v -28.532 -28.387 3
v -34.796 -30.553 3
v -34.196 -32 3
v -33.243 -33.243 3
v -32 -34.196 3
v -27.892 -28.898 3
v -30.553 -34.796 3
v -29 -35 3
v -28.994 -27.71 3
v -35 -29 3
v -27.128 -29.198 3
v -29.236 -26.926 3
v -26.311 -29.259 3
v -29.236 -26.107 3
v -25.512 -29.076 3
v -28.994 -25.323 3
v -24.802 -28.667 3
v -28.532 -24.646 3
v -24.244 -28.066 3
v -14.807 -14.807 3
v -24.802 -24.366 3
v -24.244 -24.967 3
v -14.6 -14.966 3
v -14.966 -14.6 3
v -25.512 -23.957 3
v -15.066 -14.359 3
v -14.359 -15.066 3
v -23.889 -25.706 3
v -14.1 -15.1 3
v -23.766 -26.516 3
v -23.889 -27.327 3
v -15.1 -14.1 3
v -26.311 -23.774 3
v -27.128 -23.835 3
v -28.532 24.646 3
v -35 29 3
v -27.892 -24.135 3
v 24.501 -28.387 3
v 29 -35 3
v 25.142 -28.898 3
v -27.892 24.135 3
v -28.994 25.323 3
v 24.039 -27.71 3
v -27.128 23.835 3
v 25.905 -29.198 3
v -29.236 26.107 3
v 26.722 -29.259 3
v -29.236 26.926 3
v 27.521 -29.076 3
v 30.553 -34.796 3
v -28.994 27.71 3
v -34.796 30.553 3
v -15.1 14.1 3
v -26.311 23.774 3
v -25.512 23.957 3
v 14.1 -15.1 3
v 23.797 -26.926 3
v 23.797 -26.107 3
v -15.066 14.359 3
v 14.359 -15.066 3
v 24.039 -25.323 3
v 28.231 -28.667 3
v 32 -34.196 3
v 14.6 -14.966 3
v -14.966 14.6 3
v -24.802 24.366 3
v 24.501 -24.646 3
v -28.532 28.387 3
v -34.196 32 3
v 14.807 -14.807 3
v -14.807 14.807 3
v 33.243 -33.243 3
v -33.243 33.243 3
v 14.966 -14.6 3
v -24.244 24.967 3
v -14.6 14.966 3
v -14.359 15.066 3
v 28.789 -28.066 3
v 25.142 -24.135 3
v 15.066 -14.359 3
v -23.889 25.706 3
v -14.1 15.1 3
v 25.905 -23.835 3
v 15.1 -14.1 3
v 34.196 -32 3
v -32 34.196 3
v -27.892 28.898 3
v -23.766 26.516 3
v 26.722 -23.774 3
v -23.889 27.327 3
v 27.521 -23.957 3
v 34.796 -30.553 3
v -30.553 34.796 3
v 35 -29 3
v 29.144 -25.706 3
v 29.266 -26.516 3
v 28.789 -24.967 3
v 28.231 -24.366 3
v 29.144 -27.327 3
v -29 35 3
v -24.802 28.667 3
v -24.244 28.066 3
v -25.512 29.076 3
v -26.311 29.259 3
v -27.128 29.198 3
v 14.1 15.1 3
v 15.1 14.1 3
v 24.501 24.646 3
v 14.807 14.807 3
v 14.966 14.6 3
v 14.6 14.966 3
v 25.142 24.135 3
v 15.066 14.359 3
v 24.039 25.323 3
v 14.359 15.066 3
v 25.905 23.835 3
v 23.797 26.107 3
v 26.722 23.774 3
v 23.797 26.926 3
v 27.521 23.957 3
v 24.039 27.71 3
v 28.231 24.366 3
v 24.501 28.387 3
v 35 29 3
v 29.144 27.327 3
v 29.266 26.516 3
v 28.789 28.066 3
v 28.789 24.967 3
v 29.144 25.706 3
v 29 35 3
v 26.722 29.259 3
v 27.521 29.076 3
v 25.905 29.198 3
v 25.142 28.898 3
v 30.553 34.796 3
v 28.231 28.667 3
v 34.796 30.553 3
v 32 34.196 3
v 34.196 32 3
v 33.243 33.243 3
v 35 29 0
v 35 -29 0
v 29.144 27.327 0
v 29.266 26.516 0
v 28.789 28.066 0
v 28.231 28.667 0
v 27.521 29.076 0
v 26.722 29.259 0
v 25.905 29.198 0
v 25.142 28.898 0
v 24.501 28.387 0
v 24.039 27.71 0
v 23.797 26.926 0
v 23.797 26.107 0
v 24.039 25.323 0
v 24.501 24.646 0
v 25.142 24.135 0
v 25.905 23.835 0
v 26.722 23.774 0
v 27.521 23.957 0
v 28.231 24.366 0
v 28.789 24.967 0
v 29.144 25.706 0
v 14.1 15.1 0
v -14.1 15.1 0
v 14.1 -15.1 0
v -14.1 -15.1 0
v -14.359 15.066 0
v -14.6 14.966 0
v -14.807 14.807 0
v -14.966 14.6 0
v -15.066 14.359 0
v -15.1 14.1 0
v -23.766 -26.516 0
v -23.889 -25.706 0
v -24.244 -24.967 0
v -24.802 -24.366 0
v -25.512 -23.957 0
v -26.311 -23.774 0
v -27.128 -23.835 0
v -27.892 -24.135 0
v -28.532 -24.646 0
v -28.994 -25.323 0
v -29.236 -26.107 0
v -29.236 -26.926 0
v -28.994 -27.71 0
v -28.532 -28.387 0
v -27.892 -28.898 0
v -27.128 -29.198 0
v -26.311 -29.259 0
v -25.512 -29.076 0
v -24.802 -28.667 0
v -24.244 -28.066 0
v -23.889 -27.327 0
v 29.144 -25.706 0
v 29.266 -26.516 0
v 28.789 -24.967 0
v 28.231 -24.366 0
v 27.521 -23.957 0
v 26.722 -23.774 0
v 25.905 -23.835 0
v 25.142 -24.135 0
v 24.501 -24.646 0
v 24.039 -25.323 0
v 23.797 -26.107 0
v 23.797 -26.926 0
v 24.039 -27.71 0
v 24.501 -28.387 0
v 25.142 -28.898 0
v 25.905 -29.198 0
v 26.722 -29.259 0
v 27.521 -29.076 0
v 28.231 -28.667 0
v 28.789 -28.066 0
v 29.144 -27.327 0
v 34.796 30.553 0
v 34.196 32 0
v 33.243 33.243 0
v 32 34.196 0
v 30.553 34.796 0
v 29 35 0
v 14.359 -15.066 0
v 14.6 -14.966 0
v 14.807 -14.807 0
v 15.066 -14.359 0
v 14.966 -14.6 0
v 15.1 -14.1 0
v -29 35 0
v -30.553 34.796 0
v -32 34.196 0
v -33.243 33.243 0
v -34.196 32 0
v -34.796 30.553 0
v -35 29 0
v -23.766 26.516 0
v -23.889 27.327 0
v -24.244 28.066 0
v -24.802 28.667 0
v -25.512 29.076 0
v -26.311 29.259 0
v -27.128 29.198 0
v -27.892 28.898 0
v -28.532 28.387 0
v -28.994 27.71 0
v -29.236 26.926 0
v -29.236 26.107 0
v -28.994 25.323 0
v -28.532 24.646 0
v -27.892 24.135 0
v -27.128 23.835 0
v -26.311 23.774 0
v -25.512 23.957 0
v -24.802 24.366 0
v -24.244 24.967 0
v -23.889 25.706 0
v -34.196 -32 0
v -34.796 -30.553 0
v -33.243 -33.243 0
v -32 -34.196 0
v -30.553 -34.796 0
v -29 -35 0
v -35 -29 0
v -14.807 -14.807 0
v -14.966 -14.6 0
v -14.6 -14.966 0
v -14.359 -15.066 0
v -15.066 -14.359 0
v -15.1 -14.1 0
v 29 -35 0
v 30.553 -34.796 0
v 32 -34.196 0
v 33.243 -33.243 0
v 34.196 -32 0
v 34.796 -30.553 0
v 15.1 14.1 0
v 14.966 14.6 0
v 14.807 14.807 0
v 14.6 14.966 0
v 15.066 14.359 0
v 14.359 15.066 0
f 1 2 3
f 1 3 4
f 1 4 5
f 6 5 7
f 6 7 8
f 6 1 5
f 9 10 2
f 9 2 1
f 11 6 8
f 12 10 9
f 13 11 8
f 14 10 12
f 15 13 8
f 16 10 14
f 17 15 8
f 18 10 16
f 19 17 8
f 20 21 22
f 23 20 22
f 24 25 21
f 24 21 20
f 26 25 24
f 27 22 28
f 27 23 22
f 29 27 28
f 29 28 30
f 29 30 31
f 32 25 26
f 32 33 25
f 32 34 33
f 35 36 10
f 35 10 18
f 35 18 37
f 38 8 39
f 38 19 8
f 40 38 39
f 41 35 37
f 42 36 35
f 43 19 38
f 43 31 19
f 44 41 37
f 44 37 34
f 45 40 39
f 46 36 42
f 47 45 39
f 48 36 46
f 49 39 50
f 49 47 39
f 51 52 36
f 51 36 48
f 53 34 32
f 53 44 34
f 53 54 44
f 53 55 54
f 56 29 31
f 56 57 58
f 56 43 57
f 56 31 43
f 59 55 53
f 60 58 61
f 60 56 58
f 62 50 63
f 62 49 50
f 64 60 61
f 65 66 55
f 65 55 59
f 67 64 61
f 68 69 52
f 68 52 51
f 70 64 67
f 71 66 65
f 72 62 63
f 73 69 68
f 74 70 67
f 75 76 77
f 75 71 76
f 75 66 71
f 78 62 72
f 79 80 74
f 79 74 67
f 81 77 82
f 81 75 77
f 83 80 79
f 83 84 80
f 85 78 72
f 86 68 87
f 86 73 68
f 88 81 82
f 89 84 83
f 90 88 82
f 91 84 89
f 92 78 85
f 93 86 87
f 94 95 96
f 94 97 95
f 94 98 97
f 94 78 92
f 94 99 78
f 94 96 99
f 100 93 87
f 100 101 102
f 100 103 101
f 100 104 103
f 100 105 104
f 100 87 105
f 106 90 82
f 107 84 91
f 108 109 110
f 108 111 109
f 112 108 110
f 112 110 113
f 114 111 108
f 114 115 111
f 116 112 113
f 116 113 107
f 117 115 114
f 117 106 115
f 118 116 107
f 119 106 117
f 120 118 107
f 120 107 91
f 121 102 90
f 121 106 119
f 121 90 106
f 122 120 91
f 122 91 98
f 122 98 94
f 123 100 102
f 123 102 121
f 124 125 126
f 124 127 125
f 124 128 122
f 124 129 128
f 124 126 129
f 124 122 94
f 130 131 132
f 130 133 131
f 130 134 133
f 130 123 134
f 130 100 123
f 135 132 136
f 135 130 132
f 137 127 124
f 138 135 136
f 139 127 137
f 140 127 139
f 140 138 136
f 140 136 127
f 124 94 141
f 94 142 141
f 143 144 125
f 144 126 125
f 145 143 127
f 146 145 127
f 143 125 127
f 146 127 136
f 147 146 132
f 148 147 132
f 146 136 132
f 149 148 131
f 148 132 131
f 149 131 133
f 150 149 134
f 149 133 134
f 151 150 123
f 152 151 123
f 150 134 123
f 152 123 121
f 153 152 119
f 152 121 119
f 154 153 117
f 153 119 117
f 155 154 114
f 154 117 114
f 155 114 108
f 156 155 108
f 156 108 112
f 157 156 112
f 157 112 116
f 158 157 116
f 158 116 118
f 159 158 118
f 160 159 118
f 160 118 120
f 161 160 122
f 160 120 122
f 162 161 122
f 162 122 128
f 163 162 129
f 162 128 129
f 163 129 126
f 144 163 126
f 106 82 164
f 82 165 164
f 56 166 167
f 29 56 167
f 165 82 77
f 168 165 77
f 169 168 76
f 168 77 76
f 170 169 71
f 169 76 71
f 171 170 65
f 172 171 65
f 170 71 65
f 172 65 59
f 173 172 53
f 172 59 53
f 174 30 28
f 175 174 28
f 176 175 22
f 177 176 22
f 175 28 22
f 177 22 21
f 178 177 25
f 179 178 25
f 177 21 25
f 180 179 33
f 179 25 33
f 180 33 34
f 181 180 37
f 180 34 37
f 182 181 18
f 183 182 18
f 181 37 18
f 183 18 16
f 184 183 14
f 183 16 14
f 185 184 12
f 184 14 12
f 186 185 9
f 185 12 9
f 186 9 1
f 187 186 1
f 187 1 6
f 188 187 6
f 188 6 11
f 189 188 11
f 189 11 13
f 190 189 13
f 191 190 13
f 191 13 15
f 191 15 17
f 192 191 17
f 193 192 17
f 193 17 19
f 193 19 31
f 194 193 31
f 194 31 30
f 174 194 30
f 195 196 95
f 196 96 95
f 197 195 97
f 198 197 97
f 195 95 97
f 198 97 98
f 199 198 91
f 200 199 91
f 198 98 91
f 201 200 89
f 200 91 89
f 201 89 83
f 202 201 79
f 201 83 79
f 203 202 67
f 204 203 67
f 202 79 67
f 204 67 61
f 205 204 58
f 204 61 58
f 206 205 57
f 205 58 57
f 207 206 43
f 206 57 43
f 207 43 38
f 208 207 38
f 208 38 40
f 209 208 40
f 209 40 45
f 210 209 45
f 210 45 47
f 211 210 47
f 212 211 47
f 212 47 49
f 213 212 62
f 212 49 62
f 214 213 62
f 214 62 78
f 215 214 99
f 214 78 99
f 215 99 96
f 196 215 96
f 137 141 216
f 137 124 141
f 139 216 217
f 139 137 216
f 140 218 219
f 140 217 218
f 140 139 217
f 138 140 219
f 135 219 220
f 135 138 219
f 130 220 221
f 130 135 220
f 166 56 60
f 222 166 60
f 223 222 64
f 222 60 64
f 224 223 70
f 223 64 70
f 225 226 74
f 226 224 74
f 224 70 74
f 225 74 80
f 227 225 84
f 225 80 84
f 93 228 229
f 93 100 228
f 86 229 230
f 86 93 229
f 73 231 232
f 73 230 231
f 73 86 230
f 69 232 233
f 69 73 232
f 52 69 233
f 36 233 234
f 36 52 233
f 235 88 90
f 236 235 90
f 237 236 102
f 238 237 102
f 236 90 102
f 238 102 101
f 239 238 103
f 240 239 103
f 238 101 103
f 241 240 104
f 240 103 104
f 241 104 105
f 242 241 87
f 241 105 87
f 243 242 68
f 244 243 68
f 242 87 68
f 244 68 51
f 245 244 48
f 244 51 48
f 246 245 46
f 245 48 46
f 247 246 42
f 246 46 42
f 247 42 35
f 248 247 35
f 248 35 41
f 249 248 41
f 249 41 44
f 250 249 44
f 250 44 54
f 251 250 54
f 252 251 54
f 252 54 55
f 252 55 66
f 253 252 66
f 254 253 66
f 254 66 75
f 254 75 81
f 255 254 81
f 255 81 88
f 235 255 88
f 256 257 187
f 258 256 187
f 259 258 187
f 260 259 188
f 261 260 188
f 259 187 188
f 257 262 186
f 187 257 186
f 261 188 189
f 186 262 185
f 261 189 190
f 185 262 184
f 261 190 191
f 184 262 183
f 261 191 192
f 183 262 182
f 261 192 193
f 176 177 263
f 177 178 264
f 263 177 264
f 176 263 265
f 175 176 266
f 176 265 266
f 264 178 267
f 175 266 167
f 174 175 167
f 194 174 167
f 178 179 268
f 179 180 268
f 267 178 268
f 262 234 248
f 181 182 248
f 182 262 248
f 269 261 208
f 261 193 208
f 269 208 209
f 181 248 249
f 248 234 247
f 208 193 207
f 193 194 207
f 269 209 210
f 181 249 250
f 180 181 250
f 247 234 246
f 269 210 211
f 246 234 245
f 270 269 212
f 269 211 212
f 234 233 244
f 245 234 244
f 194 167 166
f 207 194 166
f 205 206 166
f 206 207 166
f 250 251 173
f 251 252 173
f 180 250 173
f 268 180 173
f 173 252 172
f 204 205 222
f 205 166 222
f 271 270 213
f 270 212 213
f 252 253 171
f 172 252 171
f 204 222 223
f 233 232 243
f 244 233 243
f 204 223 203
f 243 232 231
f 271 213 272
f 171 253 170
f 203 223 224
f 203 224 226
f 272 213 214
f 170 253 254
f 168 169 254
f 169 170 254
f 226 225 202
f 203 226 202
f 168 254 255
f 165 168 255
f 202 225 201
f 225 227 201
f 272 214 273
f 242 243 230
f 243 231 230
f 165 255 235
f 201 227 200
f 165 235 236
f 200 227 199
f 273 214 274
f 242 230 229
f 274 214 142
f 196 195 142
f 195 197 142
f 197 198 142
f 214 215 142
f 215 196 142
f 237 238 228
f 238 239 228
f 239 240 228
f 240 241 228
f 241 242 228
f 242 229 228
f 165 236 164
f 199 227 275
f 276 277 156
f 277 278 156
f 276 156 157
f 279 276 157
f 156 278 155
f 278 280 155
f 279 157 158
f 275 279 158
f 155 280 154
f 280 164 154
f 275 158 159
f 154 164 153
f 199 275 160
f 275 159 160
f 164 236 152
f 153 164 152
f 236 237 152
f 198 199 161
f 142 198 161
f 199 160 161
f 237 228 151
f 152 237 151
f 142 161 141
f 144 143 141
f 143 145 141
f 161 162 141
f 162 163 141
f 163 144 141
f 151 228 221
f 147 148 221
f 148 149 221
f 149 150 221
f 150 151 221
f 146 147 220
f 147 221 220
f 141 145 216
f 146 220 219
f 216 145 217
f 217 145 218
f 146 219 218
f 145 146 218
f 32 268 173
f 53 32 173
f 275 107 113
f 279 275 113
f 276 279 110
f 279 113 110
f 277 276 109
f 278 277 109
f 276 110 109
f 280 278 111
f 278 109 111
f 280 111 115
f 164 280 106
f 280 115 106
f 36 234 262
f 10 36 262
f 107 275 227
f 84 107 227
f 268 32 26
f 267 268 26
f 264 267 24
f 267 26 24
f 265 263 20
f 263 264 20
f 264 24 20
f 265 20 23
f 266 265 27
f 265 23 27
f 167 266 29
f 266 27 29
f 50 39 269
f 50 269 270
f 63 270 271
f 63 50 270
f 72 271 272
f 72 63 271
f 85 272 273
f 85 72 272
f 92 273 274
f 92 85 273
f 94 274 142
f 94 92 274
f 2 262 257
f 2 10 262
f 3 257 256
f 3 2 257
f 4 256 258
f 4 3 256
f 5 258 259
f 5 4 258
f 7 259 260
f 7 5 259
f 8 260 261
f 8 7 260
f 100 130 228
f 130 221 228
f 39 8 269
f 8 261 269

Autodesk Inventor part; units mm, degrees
ref_plane "YZ Plane" through (0, 0, 0) normal (1, 0, 0) x (0, 1, 0)
ref_plane "XZ Plane" through (0, 0, 0) normal (0, 1, 0) x (-1, 0, 0)
ref_plane "XY Plane" through (0, 0, 0) normal (0, 0, 1) x (1, 0, 0)
sketch "Sketch1" plane through (0, 0, 0) normal (0, 0, 1) x (1, 0, 0)
  line L0 (-35, -35) -> (35, -35)
  line L1 (35, -35) -> (35, 35)
  line L2 (35, 35) -> (-35, 35)
  line L3 (-35, 35) -> (-35, -35)
  line L4 (-35, -35) -> (35, 35) construction
  line L5 (35, -35) -> (-35, 35) construction
  line L6 (15.1, -15.1) -> (-15.1, -15.1)
  line L7 (-15.1, -15.1) -> (-15.1, 15.1)
  line L8 (-15.1, 15.1) -> (15.1, 15.1)
  line L9 (15.1, 15.1) -> (15.1, -15.1)
  line L10 (15.1, -15.1) -> (-15.1, 15.1) construction
  line L11 (-15.1, -15.1) -> (15.1, 15.1) construction
  point P0 (0, 0)
  dimension "d172" = 30.2
  dimension "d181" = 19.9
  dimension "d187" = 19.9
  dimension "d189" = 70
extrude "Plate5" add sketch "Sketch1" along normal blind 3
sketch "Sketch9" plane through (0, 0, 3) normal (0, 0, 1) x (1, 0, 0)
  circle A0 centre (26.5165, -26.5165) radius 2.75
  line L0 (26.5165, 26.5165) -> (-26.5165, 26.5165) construction
  line L1 (-26.5165, 26.5165) -> (-26.5165, -26.5165) construction
  line L2 (-26.5165, -26.5165) -> (26.5165, -26.5165) construction
  line L3 (26.5165, -26.5165) -> (26.5165, 26.5165) construction
  line L4 (26.5165, 26.5165) -> (-26.5165, -26.5165) construction
  line L5 (-26.5165, 26.5165) -> (26.5165, -26.5165) construction
  circle A1 centre (-26.5165, -26.5165) radius 2.75
  circle A2 centre (26.5165, 26.5165) radius 2.75
  circle A3 centre (-26.5165, 26.5165) radius 2.75
  circle A4 centre (0, 0) radius 37.5 construction
  line L6 (-15.1, -15.1) -> (-15.1, 15.1) projected
  line L7 (-15.1, 15.1) -> (15.1, 15.1) projected
  line L8 (15.1, 15.1) -> (15.1, -15.1) projected
  line L9 (15.1, -15.1) -> (-15.1, -15.1) projected
  line L10 (35, -35) -> (-35, -35) projected
  line L11 (35, 35) -> (35, -35) projected
  line L12 (-35, 35) -> (35, 35) projected
  line L13 (-35, -35) -> (-35, 35) projected
  line L14 (-15, 15) -> (15, 15) construction
  line L15 (15, 15) -> (15, -15) construction
  line L16 (15, -15) -> (-15, -15) construction
  line L17 (-15, -15) -> (-15, 15) construction
  line L18 (-15, -15) -> (15, 15) construction
  dimension "d188" = 75
  dimension "d174" = 5.5
  dimension "d184" = 30
  dimension "d185" = 30
  dimension "d186" = 16.2868
extrude "Cut2" cut sketch "Sketch9" against normal blind 3 contours A0 | A1 | A2 | A3
fillet "Corner Round1" radius 6 4 edges at (35, 35, 1.5) (-35, 35, 1.5) (-35, -35, 1.5) (35, -35, 1.5)
fillet "Corner Round2" radius 1 4 edges at (-15.1, 15.1, 1.5) (-15.1, -15.1, 1.5) (15.1, -15.1, 1.5) (15.1, 15.1, 1.5)
properties part number "ANP 1426 FDS Way FLANGE 2" material "Stainless Steel"
